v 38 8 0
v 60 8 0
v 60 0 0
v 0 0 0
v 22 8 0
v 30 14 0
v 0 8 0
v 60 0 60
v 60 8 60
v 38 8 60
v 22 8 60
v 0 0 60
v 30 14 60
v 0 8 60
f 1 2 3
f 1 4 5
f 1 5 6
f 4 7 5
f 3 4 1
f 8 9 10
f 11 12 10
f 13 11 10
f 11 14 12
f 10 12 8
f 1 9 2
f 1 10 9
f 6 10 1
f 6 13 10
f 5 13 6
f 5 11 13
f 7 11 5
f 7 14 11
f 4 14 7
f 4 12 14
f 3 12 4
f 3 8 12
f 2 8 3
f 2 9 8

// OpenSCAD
$fn = 32;

// ----------------------------------------------------------------------
// V guide rail: vrib, 60 mm wide
// ----------------------------------------------------------------------

// --- parameters (mm) ---
rail_w = 60;              // rail width, X
base_t = 8;               // base plate thickness
v_depth = 6;              // V feature depth / height
v_half_w = 8;             // half width of the V at the base face
plate_t = 60;             // rail length, Z (the extrusion height)

profile = [[0, 0], [60, 0], [60, 8], [38, 8], [30, 14], [22, 8], [0, 8]];  // primary outline, 7 points, counter clockwise

// --- the one profile operation ---
linear_extrude(height = plate_t) polygon(points = profile);
